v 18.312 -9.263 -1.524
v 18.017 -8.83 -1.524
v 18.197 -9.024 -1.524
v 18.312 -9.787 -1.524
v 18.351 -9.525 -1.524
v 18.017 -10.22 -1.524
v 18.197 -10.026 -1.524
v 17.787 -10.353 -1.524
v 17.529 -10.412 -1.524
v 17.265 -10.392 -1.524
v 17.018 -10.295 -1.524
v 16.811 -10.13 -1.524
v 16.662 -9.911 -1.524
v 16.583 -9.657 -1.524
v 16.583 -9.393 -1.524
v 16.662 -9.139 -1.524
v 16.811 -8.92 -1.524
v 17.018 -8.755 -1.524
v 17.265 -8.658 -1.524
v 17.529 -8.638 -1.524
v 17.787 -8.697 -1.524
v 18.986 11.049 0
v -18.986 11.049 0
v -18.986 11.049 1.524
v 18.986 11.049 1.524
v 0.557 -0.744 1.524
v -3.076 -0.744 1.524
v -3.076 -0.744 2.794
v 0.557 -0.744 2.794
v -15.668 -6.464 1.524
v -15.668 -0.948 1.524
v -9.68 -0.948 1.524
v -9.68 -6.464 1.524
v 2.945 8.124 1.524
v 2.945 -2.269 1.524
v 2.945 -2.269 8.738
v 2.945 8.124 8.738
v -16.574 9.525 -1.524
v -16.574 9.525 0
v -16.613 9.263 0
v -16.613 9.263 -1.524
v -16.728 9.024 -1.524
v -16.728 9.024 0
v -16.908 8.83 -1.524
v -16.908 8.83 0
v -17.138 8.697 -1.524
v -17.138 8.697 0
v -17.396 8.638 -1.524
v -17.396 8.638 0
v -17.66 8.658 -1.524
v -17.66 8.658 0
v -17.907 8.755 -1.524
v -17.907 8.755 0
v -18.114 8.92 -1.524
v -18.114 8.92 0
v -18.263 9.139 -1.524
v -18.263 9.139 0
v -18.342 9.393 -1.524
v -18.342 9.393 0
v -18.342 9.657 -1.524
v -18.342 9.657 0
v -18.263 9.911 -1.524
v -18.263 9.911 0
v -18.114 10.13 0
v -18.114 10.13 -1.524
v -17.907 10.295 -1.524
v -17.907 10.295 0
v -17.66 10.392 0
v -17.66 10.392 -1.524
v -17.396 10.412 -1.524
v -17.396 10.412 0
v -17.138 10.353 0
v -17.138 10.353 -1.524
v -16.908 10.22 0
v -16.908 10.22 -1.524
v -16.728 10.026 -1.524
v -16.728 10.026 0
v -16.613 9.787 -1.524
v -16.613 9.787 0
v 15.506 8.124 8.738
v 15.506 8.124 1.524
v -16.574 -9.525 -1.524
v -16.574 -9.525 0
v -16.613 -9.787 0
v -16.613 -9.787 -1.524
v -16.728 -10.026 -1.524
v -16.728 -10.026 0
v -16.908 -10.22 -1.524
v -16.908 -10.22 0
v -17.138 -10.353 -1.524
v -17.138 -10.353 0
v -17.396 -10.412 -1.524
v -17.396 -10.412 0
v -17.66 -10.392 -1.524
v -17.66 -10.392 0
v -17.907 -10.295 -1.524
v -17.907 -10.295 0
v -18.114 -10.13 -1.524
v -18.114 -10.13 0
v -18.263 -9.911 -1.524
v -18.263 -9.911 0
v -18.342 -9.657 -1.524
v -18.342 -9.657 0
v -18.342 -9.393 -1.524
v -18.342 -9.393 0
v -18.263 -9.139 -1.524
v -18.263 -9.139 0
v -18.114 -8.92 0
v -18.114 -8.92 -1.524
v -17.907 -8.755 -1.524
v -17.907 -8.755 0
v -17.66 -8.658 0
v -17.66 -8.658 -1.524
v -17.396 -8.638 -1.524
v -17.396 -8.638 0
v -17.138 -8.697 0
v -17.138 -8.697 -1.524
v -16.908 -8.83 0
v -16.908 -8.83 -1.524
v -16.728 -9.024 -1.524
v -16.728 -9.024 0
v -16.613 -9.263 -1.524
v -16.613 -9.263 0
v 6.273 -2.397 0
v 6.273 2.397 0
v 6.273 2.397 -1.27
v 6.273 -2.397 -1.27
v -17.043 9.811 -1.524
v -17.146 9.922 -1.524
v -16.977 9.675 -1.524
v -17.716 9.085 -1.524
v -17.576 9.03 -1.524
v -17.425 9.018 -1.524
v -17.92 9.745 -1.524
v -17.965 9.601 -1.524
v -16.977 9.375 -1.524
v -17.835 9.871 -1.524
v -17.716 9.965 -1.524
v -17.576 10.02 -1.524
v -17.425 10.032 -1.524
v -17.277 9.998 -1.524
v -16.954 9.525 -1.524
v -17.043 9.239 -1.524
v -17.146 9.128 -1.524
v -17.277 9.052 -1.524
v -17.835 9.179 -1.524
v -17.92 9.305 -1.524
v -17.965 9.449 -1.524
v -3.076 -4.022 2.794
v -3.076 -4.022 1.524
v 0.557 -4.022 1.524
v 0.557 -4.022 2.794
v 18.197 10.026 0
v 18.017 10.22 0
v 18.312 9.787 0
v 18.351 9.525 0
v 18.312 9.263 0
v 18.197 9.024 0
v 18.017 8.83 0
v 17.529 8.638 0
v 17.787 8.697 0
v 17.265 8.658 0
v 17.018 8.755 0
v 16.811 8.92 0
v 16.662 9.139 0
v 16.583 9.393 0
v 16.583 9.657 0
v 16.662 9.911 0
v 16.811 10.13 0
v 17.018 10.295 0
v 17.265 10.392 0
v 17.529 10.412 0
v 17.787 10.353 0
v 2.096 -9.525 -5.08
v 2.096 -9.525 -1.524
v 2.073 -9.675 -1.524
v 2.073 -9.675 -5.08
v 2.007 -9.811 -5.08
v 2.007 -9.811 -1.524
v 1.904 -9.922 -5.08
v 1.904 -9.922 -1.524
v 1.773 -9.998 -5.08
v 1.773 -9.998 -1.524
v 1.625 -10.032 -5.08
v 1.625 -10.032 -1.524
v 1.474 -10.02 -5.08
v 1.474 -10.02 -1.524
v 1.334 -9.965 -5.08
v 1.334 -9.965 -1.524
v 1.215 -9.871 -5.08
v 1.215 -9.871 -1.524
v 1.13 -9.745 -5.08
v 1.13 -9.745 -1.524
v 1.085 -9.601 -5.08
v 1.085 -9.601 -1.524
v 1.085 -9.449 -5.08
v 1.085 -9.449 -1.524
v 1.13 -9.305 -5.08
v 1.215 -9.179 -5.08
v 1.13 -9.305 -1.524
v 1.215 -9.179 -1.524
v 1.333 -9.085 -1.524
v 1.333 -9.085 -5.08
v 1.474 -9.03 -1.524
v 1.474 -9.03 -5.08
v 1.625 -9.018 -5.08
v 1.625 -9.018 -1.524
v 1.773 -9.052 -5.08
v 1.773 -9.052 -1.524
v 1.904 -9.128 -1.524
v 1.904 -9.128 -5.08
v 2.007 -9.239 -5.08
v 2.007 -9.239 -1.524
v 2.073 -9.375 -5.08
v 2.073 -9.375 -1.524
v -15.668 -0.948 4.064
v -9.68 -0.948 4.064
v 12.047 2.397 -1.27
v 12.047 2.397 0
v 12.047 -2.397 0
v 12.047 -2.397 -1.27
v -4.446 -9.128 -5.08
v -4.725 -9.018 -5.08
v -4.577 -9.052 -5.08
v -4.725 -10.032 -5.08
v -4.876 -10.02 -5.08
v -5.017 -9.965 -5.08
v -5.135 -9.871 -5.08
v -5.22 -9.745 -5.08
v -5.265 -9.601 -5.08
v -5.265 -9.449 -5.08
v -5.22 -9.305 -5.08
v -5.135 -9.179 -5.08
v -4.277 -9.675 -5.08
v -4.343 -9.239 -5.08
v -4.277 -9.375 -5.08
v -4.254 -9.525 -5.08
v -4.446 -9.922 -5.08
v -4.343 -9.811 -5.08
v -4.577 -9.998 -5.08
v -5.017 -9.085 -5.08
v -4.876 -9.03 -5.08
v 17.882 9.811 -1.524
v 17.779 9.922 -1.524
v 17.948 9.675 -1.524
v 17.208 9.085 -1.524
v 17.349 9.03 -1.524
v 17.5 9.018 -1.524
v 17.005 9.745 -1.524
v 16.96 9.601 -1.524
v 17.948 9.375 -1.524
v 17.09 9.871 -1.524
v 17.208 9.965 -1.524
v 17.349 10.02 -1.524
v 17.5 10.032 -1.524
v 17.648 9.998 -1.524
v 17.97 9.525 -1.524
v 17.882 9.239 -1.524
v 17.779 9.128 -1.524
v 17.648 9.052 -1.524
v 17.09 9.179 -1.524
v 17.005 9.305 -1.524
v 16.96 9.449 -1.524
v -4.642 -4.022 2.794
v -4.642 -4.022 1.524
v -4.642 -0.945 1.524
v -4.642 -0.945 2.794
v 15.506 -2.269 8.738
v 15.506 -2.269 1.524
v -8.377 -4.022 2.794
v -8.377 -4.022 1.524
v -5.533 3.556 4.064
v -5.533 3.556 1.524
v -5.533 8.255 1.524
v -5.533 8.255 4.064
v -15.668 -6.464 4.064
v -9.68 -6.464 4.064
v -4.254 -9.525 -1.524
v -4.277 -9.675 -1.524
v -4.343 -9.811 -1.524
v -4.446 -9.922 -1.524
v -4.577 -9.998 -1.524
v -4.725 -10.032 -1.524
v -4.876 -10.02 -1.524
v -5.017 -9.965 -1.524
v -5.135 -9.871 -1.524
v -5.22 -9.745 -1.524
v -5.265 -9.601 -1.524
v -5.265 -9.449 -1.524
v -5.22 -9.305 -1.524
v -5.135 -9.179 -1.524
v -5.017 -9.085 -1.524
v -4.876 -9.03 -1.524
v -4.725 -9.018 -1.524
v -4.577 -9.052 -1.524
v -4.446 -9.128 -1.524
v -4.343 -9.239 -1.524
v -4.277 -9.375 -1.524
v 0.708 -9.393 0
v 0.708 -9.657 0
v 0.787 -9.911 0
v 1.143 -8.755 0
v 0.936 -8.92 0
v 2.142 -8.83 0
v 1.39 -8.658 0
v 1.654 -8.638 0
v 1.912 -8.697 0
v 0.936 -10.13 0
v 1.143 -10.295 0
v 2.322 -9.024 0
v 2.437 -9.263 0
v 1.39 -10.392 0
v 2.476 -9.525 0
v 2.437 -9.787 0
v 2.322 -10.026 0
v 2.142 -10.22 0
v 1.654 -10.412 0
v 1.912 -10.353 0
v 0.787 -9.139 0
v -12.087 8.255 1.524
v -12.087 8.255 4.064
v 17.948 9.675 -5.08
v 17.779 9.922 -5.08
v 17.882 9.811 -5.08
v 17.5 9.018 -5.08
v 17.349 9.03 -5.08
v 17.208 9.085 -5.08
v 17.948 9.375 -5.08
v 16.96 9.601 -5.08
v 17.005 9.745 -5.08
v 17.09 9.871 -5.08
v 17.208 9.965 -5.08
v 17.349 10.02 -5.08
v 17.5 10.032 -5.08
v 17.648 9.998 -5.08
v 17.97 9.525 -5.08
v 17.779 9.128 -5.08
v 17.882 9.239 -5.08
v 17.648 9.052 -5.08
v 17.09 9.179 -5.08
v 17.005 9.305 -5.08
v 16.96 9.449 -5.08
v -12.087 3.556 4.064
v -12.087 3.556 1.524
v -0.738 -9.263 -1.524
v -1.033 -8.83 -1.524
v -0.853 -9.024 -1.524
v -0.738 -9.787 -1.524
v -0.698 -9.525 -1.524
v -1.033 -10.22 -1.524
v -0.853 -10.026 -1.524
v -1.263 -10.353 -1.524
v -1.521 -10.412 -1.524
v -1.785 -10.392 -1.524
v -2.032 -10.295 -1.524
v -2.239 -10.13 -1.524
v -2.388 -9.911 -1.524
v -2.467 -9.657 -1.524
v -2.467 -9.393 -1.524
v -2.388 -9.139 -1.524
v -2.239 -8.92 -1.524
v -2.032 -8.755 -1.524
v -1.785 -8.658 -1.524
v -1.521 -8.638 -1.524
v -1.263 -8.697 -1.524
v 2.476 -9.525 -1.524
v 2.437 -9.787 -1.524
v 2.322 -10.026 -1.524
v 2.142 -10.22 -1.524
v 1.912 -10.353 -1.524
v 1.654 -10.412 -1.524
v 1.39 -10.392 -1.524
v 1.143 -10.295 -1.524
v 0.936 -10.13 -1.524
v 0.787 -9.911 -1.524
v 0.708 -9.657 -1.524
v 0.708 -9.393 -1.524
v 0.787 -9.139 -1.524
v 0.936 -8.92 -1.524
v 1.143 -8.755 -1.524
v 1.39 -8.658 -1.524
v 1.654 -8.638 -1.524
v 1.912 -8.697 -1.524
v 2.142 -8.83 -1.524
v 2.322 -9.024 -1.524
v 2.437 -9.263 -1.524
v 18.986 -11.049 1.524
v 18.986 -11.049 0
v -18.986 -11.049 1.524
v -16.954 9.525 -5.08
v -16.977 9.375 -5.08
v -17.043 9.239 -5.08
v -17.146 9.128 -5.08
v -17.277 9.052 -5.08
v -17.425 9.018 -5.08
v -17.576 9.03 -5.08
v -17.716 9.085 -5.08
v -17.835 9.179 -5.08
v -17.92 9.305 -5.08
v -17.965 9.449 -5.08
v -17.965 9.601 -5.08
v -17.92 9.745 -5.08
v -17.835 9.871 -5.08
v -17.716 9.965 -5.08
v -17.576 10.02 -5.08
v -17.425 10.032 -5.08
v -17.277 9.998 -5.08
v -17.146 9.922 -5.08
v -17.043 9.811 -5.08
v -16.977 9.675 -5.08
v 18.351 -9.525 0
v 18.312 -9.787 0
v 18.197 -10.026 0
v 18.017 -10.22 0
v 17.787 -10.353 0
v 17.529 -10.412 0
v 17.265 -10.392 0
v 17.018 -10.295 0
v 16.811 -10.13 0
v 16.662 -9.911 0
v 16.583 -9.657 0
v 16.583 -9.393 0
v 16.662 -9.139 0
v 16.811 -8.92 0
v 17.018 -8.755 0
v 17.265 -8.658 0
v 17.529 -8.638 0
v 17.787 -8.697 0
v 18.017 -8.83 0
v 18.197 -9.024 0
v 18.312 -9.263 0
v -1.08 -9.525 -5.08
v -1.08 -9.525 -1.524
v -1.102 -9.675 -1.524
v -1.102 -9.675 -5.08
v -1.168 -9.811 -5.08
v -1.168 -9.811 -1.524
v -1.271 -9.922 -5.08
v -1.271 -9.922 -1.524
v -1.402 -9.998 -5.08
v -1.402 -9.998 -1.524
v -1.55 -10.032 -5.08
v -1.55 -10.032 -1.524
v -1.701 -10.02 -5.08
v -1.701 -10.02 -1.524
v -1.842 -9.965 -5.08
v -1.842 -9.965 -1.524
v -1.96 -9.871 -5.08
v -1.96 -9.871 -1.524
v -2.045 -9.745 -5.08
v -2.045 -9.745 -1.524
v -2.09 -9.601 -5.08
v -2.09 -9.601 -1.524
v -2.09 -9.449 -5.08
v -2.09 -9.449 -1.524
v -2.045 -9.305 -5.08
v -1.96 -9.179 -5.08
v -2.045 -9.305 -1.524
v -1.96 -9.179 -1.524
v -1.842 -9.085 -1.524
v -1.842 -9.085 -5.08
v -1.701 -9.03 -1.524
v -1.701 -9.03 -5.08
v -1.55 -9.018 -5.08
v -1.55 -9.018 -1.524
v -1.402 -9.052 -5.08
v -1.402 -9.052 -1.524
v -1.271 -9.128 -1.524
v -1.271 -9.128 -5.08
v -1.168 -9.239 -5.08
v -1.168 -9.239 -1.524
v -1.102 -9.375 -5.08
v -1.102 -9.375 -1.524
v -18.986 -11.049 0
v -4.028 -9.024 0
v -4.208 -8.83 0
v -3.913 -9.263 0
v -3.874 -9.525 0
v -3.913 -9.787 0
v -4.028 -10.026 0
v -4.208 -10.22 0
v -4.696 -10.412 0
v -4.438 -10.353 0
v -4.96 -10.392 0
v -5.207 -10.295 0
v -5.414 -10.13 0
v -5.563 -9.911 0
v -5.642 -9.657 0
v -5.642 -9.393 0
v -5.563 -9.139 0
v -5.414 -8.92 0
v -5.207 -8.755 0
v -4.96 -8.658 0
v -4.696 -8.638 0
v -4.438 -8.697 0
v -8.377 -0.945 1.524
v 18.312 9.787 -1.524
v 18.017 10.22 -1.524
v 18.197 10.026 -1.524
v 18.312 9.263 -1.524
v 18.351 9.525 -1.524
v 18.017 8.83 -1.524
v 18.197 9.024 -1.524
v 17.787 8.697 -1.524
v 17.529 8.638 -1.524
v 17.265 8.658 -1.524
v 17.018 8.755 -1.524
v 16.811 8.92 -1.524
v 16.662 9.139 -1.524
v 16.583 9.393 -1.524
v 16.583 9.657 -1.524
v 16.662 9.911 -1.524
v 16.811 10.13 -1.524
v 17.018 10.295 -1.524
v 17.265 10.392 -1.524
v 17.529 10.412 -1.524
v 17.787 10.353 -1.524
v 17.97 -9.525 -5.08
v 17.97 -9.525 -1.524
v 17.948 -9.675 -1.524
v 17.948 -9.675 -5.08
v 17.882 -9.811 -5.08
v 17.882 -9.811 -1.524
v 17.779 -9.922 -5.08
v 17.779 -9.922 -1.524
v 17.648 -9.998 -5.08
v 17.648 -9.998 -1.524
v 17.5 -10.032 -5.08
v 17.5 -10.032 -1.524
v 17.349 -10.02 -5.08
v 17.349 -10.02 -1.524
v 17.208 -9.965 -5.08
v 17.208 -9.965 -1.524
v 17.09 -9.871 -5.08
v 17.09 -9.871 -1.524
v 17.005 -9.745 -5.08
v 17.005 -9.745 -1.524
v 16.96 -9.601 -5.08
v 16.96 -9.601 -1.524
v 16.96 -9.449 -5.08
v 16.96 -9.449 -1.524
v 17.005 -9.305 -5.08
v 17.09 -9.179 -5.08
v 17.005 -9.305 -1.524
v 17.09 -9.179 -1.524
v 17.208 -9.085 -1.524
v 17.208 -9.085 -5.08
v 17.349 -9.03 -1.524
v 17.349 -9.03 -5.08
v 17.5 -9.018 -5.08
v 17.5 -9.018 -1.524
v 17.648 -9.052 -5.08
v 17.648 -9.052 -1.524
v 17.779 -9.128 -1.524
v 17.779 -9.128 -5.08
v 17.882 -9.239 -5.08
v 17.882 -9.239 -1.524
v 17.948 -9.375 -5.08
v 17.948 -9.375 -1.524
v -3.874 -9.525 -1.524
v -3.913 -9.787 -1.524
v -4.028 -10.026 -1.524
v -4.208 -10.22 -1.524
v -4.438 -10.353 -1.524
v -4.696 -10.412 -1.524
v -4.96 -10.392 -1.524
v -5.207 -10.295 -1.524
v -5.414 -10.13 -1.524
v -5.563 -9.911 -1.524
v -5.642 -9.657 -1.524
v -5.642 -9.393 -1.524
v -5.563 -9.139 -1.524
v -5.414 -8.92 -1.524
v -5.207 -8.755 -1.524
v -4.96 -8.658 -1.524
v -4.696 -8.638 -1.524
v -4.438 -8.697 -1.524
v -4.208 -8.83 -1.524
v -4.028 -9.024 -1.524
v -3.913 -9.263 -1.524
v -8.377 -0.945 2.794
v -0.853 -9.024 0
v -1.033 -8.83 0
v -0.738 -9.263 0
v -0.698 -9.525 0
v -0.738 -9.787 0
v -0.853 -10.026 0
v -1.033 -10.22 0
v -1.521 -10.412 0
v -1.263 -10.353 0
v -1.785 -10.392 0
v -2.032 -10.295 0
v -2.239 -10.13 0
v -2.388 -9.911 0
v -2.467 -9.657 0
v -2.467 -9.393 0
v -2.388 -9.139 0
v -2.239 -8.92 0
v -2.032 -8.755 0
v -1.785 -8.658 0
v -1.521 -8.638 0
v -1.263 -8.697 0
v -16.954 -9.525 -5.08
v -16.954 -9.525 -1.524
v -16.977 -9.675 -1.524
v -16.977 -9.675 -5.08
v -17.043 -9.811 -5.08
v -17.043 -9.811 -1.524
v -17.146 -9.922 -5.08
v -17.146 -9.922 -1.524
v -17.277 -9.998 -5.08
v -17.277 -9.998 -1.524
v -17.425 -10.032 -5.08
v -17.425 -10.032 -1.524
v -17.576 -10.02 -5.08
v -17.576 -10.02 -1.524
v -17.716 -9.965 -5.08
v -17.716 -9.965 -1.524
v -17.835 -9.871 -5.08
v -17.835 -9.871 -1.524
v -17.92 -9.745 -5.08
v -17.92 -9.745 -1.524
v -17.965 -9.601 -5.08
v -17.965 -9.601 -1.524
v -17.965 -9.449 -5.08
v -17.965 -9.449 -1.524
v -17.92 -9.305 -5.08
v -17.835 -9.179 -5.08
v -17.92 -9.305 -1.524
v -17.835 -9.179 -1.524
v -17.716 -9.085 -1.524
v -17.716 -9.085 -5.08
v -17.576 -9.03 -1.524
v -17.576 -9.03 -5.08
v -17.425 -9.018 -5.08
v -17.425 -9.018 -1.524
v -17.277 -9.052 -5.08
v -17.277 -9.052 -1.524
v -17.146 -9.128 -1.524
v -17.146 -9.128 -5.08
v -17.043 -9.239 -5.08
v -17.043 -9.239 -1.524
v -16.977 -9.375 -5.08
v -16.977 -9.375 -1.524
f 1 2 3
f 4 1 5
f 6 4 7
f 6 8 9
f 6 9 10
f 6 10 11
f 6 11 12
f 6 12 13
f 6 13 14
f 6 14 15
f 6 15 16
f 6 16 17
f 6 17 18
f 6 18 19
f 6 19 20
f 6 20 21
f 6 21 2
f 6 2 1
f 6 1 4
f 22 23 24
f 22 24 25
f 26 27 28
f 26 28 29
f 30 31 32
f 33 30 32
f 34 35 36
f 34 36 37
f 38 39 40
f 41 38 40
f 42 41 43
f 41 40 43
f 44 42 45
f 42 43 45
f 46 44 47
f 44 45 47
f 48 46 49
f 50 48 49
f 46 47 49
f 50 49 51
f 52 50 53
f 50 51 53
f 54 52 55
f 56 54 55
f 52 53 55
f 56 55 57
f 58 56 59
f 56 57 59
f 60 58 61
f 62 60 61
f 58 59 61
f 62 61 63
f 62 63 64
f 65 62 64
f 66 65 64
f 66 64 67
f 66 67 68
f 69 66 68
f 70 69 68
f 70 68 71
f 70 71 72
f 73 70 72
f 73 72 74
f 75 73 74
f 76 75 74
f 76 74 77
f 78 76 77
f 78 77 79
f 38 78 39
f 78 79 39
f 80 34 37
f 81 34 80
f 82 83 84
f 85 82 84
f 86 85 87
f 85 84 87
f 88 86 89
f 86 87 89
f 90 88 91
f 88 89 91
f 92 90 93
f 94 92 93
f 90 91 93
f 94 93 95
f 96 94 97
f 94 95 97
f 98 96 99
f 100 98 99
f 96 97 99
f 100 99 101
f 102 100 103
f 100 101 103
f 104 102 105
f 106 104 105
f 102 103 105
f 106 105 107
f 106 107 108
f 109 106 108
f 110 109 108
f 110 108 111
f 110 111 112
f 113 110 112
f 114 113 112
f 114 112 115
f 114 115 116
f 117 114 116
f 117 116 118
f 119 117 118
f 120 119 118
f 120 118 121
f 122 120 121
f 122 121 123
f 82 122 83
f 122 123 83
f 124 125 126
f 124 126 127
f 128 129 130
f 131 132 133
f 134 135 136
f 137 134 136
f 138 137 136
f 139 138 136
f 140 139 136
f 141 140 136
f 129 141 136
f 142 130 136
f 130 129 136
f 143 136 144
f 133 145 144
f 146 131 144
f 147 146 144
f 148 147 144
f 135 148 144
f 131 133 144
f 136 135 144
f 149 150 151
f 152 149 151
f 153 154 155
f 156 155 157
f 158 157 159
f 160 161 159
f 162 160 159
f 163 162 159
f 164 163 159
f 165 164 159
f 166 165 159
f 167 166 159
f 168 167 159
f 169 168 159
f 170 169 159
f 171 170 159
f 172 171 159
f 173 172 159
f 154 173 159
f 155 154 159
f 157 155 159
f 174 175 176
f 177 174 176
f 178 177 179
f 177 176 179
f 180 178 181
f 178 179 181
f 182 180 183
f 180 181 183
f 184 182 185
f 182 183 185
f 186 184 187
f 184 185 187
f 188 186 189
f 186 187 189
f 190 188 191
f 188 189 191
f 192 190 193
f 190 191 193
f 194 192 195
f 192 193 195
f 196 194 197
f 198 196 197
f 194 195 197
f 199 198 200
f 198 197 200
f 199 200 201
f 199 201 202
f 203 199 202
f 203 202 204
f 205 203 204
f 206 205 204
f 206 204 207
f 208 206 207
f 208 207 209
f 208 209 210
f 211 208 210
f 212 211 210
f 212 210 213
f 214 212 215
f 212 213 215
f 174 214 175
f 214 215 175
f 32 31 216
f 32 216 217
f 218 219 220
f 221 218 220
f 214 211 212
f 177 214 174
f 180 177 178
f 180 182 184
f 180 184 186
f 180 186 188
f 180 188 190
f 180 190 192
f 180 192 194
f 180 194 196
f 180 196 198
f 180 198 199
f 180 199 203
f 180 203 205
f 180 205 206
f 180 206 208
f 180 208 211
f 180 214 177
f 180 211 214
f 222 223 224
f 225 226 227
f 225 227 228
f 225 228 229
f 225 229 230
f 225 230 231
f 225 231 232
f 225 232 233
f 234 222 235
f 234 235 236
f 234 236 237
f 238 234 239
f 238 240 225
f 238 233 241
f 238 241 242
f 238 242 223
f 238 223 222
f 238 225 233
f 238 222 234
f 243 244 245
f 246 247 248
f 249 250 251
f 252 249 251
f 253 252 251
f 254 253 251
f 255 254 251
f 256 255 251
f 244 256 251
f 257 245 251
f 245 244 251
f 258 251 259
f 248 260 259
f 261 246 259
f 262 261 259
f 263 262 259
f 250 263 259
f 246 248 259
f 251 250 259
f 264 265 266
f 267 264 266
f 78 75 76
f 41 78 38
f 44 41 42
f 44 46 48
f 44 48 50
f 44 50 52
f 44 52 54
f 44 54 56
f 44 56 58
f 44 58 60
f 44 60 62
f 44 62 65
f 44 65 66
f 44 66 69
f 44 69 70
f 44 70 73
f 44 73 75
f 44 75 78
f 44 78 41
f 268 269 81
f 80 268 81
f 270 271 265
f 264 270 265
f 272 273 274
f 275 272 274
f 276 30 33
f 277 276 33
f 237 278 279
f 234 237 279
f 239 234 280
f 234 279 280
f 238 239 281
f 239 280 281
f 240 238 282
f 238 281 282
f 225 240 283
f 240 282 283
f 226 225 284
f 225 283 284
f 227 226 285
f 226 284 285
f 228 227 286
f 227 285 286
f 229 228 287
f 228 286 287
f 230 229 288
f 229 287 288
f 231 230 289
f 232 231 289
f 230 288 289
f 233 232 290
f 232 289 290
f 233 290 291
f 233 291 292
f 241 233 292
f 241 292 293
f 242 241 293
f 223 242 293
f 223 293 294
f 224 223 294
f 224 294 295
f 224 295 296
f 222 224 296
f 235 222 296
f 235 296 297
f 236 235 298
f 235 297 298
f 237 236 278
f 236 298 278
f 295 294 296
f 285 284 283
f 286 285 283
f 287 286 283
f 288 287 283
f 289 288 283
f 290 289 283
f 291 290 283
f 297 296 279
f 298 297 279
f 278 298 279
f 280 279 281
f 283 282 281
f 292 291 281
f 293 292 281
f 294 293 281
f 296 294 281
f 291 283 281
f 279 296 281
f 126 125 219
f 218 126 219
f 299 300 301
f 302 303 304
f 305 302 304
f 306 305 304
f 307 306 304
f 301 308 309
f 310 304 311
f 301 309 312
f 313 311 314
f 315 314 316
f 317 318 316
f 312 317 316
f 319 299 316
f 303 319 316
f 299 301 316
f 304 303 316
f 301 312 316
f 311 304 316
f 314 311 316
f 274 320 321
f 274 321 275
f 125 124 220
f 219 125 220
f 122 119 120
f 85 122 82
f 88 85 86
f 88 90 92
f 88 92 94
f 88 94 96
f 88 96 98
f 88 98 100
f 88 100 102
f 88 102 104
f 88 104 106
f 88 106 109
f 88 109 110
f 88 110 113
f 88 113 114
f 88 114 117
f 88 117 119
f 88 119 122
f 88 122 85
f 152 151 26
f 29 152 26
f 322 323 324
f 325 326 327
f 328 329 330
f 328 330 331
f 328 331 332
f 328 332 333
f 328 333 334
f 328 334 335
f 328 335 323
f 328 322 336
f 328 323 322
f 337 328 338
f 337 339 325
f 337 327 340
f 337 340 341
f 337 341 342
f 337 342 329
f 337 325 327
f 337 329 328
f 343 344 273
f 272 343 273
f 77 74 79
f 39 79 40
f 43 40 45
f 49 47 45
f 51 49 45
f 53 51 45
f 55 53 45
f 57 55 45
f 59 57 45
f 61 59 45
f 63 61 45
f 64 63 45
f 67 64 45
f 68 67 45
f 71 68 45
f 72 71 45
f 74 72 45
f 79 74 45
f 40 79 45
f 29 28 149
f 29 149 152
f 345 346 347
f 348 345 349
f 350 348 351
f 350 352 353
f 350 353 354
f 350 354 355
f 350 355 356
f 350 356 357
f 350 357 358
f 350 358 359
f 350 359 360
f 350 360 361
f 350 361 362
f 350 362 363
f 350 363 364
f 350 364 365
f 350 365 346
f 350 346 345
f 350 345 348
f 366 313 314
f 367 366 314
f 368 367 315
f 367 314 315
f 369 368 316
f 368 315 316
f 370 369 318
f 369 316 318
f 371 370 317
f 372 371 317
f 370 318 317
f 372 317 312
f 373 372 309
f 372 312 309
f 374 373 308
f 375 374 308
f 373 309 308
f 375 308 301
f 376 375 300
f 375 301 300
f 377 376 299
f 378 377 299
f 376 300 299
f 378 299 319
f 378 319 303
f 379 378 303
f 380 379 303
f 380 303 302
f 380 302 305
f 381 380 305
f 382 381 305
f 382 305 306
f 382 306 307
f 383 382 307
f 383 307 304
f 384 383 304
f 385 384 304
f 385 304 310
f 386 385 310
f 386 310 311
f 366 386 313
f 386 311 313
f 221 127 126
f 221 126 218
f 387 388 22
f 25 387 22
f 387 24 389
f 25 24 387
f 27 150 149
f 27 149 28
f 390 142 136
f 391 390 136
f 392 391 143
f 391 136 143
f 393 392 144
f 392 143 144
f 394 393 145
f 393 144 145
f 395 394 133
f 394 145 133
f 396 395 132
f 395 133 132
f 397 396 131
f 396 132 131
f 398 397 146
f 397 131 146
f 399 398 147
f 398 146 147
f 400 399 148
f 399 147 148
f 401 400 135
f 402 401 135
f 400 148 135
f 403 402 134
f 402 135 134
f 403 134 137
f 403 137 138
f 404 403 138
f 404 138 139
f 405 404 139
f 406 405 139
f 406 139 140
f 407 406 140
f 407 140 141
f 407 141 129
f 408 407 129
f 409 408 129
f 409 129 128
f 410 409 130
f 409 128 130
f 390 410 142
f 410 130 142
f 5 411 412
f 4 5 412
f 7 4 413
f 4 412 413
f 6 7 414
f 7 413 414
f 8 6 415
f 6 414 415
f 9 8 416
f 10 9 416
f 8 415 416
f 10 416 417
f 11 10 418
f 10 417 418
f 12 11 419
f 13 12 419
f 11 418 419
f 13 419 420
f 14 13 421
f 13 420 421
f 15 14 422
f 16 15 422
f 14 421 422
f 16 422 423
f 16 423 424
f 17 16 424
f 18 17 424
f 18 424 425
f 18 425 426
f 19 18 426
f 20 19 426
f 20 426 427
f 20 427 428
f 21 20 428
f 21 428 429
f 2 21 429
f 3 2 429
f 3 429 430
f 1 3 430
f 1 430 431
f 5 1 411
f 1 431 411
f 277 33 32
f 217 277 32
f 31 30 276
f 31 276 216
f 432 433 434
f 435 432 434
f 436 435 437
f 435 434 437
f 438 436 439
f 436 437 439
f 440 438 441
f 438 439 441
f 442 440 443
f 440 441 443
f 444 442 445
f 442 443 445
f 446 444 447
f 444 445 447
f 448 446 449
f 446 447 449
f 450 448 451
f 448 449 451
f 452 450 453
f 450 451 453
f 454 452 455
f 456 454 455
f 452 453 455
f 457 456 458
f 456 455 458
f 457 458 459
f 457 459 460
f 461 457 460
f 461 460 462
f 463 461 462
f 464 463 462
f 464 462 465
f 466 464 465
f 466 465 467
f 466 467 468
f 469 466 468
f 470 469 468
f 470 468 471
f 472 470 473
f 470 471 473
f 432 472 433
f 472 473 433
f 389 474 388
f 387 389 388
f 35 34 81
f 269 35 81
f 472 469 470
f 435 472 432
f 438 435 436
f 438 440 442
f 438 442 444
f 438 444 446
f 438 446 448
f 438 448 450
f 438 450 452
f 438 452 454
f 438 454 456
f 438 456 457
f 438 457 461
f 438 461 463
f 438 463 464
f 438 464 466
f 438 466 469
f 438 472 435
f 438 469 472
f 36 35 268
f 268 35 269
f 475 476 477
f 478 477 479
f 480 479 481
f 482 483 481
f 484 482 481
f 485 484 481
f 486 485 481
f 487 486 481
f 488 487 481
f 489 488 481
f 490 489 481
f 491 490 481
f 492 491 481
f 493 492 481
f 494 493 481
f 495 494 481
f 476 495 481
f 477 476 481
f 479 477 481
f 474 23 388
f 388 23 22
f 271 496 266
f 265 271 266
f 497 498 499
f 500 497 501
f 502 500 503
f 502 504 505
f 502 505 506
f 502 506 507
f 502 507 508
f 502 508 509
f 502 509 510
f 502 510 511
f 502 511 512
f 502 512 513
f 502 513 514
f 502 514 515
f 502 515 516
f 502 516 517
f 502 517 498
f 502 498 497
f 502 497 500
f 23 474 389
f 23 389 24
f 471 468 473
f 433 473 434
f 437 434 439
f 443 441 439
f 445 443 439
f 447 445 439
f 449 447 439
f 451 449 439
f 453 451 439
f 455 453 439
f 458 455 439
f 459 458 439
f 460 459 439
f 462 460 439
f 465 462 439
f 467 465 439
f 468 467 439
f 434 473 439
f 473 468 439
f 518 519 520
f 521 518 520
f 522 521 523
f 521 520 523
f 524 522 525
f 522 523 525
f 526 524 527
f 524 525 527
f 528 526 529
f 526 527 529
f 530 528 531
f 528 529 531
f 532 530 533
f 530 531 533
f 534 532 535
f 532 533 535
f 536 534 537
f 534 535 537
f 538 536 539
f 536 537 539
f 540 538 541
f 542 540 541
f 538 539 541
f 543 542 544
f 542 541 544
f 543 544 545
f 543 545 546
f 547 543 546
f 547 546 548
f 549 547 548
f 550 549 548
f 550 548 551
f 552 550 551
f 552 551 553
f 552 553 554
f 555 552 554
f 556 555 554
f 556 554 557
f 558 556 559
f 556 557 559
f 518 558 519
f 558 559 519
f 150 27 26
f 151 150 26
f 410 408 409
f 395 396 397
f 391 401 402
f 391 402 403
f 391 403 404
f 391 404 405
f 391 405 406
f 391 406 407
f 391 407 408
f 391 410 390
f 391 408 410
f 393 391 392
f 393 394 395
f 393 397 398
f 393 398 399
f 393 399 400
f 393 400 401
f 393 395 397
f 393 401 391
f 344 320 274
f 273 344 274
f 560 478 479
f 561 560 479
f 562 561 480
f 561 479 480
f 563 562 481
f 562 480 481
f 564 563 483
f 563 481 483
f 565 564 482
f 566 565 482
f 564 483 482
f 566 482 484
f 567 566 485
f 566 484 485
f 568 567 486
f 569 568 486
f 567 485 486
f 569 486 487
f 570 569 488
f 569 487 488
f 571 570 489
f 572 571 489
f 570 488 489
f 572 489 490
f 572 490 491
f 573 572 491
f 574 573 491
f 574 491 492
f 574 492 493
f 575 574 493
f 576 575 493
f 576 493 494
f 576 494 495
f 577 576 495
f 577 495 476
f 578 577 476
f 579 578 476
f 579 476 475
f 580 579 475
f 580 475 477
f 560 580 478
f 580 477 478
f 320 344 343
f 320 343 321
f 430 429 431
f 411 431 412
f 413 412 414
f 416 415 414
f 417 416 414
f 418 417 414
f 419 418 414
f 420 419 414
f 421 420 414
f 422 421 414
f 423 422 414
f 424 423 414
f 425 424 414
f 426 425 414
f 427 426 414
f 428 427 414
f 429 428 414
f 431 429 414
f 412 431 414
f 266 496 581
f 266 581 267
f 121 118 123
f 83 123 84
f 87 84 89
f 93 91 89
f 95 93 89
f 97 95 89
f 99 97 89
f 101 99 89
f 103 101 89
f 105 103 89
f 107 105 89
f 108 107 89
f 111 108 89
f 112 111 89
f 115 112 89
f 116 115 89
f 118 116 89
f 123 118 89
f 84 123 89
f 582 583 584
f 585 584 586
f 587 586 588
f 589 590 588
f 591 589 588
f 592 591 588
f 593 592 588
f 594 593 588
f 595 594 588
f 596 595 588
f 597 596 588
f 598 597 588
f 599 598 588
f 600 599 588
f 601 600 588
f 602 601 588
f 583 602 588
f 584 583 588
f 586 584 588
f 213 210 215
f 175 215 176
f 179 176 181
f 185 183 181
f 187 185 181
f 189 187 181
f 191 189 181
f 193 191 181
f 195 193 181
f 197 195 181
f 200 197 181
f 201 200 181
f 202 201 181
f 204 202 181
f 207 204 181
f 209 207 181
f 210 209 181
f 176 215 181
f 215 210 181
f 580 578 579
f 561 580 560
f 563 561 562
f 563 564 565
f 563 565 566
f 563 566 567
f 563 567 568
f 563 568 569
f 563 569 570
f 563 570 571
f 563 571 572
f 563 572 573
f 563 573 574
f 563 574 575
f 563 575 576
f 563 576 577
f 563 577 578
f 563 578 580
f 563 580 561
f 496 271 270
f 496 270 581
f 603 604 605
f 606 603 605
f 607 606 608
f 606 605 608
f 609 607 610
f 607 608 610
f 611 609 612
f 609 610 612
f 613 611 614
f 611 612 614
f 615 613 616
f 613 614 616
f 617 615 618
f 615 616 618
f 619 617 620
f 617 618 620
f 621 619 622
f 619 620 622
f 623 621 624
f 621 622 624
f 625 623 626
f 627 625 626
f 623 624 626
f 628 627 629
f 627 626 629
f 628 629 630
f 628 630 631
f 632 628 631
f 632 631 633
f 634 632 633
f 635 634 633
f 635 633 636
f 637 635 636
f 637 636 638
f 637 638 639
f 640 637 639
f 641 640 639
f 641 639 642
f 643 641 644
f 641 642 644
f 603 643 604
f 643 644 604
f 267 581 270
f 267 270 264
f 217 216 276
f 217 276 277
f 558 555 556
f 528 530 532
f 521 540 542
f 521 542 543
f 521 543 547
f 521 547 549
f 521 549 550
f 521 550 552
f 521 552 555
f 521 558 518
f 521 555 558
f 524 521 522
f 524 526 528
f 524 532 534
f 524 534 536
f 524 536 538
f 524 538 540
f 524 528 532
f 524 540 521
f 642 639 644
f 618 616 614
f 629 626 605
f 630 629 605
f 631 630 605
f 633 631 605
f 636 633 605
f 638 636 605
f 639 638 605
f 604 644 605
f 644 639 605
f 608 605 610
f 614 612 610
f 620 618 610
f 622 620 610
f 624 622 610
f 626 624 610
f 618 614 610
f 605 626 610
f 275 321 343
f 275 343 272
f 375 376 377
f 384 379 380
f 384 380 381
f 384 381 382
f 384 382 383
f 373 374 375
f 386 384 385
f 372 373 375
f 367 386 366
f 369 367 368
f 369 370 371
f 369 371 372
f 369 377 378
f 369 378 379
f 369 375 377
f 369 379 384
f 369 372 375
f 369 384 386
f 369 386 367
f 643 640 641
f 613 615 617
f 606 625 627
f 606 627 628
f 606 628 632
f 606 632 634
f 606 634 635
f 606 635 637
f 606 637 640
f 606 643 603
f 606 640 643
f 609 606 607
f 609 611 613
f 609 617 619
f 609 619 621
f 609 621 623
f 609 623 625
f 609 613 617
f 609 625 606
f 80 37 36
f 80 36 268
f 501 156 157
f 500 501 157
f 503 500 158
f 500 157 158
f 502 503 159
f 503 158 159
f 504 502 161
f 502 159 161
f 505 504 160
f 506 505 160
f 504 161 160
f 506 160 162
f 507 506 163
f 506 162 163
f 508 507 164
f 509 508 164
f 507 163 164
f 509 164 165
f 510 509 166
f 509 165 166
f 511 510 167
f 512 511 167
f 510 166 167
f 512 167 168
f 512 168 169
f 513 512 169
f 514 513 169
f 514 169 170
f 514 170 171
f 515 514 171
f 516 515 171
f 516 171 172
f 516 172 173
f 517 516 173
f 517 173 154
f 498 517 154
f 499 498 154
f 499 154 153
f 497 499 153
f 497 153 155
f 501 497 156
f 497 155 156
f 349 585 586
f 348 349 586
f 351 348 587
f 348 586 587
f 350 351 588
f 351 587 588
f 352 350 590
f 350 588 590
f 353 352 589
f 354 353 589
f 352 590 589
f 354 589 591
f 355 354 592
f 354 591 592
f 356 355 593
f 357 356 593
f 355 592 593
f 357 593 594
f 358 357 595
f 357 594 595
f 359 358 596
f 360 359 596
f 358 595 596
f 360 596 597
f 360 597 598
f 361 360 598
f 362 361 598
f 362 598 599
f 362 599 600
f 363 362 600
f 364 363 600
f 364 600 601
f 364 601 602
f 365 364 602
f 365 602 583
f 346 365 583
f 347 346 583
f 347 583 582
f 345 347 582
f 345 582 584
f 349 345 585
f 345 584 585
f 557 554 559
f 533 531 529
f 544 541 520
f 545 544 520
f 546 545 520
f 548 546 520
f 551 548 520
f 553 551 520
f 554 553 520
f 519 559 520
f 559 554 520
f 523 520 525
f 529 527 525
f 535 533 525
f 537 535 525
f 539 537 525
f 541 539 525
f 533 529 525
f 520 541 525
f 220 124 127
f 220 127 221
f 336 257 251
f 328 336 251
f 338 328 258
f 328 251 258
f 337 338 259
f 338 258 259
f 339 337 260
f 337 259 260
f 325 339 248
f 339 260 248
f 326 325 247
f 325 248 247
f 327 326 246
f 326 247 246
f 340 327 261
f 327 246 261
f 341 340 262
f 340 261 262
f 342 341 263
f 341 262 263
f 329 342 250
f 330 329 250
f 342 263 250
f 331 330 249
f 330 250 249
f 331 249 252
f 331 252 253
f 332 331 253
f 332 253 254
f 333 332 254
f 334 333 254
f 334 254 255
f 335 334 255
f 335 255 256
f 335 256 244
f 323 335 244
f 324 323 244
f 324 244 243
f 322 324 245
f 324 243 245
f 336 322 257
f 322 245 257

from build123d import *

# Parameters (mm, degrees)
F0_W      = 37.973
F0_H      = 22.098
F1_DEPTH  = 1.524
F2_W      = 12.561312
F2_H      = 10.393114
F3_DEPTH  = 7.2136
F4_W      = 6.554271
F4_H      = 4.69848
F4_W_2    = 5.987631
F4_H_2    = 5.516189
F5_DEPTH  = 2.54
F6_W      = 3.734964
F6_H      = 3.07779
F6_W_2    = 3.6331
F6_H_2    = 3.278057
F7_DEPTH  = 1.27
F8_W      = 5.773047
F8_H      = 4.794508
F9_DEPTH  = 1.27
F10_R     = 0.889
F11_DEPTH = 1.524
F12_R     = 0.508
F12_R_2   = 0.508001
F13_DEPTH = 3.556


with BuildPart() as f1:
    # F0 (on Top) → F1 (new body)
    with BuildSketch(Plane.XY):
        Rectangle(F0_W, F0_H)
    extrude(amount=F1_DEPTH)


with BuildPart() as f3:
    # F2 (on face) → F3 (new body)
    with BuildSketch(Plane.XY.offset(1.524)):
        with Locations((9.225395, 2.927721)):
            Rectangle(F2_W, F2_H)
    extrude(amount=F3_DEPTH)


with BuildPart() as f5:
    # F4 (on face) → F5 (new body)
    with BuildSketch(Plane.XY.offset(1.524)):
        with Locations((-8.809889, 5.905727)):
            Rectangle(F4_W, F4_H)
        with Locations((-12.674262, -3.706126)):
            Rectangle(F4_W_2, F4_H_2)
    extrude(amount=F5_DEPTH)


with BuildPart() as f7:
    # F6 (on face) → F7 (new body)
    with BuildSketch(Plane.XY.offset(1.524)):
        with Locations((-6.509353, -2.483502)):
            Rectangle(F6_W, F6_H)
        with Locations((-1.259806, -2.383369)):
            Rectangle(F6_W_2, F6_H_2)
    extrude(amount=F7_DEPTH)


with BuildPart() as f9:
    # F8 (on face) → F9 (new body)
    with BuildSketch(Plane(origin=(0, 0, 0), x_dir=(1, 0, 0), z_dir=(0, 0, -1))):
        with Locations((9.160016, 0)):
            Rectangle(F8_W, F8_H)
    extrude(amount=F9_DEPTH)


with BuildPart() as f11:
    # F10 (on face) → F11 (new body)
    with BuildSketch(Plane(origin=(0, 0, 0), x_dir=(1, 0, 0), z_dir=(0, 0, -1))):
        with Locations((17.4625, -9.525)):
            Circle(F10_R)
        with Locations((-17.4625, -9.525)):
            Circle(F10_R)
        with Locations((-17.4625, 9.525)):
            Circle(F10_R)
        with Locations((-4.7625, 9.525)):
            Circle(F10_R)
        with Locations((-1.5875, 9.525)):
            Circle(F10_R)
        with Locations((1.5875, 9.525)):
            Circle(F10_R)
        with Locations((17.4625, 9.525)):
            Circle(F10_R)
    extrude(amount=F11_DEPTH)


with BuildPart() as f13:
    # F12 (on face) → F13 (new body)
    with BuildSketch(Plane(origin=(0, 0, -1.524), x_dir=(1, 0, 0), z_dir=(0, 0, -1))):
        with Locations((-17.4625, -9.525)):
            Circle(F12_R)
        with Locations((-17.4625, 9.525)):
            Circle(F12_R)
        with Locations((-4.7625, 9.525)):
            Circle(F12_R_2)
        with Locations((-1.5875, 9.525)):
            Circle(F12_R)
        with Locations((1.5875, 9.525)):
            Circle(F12_R)
        with Locations((17.4625, 9.525)):
            Circle(F12_R)
        with Locations((17.4625, -9.525)):
            Circle(F12_R)
    extrude(amount=F13_DEPTH)


solid = Compound([f1.part, f3.part, f5.part, f7.part, f9.part, f11.part, f13.part])
